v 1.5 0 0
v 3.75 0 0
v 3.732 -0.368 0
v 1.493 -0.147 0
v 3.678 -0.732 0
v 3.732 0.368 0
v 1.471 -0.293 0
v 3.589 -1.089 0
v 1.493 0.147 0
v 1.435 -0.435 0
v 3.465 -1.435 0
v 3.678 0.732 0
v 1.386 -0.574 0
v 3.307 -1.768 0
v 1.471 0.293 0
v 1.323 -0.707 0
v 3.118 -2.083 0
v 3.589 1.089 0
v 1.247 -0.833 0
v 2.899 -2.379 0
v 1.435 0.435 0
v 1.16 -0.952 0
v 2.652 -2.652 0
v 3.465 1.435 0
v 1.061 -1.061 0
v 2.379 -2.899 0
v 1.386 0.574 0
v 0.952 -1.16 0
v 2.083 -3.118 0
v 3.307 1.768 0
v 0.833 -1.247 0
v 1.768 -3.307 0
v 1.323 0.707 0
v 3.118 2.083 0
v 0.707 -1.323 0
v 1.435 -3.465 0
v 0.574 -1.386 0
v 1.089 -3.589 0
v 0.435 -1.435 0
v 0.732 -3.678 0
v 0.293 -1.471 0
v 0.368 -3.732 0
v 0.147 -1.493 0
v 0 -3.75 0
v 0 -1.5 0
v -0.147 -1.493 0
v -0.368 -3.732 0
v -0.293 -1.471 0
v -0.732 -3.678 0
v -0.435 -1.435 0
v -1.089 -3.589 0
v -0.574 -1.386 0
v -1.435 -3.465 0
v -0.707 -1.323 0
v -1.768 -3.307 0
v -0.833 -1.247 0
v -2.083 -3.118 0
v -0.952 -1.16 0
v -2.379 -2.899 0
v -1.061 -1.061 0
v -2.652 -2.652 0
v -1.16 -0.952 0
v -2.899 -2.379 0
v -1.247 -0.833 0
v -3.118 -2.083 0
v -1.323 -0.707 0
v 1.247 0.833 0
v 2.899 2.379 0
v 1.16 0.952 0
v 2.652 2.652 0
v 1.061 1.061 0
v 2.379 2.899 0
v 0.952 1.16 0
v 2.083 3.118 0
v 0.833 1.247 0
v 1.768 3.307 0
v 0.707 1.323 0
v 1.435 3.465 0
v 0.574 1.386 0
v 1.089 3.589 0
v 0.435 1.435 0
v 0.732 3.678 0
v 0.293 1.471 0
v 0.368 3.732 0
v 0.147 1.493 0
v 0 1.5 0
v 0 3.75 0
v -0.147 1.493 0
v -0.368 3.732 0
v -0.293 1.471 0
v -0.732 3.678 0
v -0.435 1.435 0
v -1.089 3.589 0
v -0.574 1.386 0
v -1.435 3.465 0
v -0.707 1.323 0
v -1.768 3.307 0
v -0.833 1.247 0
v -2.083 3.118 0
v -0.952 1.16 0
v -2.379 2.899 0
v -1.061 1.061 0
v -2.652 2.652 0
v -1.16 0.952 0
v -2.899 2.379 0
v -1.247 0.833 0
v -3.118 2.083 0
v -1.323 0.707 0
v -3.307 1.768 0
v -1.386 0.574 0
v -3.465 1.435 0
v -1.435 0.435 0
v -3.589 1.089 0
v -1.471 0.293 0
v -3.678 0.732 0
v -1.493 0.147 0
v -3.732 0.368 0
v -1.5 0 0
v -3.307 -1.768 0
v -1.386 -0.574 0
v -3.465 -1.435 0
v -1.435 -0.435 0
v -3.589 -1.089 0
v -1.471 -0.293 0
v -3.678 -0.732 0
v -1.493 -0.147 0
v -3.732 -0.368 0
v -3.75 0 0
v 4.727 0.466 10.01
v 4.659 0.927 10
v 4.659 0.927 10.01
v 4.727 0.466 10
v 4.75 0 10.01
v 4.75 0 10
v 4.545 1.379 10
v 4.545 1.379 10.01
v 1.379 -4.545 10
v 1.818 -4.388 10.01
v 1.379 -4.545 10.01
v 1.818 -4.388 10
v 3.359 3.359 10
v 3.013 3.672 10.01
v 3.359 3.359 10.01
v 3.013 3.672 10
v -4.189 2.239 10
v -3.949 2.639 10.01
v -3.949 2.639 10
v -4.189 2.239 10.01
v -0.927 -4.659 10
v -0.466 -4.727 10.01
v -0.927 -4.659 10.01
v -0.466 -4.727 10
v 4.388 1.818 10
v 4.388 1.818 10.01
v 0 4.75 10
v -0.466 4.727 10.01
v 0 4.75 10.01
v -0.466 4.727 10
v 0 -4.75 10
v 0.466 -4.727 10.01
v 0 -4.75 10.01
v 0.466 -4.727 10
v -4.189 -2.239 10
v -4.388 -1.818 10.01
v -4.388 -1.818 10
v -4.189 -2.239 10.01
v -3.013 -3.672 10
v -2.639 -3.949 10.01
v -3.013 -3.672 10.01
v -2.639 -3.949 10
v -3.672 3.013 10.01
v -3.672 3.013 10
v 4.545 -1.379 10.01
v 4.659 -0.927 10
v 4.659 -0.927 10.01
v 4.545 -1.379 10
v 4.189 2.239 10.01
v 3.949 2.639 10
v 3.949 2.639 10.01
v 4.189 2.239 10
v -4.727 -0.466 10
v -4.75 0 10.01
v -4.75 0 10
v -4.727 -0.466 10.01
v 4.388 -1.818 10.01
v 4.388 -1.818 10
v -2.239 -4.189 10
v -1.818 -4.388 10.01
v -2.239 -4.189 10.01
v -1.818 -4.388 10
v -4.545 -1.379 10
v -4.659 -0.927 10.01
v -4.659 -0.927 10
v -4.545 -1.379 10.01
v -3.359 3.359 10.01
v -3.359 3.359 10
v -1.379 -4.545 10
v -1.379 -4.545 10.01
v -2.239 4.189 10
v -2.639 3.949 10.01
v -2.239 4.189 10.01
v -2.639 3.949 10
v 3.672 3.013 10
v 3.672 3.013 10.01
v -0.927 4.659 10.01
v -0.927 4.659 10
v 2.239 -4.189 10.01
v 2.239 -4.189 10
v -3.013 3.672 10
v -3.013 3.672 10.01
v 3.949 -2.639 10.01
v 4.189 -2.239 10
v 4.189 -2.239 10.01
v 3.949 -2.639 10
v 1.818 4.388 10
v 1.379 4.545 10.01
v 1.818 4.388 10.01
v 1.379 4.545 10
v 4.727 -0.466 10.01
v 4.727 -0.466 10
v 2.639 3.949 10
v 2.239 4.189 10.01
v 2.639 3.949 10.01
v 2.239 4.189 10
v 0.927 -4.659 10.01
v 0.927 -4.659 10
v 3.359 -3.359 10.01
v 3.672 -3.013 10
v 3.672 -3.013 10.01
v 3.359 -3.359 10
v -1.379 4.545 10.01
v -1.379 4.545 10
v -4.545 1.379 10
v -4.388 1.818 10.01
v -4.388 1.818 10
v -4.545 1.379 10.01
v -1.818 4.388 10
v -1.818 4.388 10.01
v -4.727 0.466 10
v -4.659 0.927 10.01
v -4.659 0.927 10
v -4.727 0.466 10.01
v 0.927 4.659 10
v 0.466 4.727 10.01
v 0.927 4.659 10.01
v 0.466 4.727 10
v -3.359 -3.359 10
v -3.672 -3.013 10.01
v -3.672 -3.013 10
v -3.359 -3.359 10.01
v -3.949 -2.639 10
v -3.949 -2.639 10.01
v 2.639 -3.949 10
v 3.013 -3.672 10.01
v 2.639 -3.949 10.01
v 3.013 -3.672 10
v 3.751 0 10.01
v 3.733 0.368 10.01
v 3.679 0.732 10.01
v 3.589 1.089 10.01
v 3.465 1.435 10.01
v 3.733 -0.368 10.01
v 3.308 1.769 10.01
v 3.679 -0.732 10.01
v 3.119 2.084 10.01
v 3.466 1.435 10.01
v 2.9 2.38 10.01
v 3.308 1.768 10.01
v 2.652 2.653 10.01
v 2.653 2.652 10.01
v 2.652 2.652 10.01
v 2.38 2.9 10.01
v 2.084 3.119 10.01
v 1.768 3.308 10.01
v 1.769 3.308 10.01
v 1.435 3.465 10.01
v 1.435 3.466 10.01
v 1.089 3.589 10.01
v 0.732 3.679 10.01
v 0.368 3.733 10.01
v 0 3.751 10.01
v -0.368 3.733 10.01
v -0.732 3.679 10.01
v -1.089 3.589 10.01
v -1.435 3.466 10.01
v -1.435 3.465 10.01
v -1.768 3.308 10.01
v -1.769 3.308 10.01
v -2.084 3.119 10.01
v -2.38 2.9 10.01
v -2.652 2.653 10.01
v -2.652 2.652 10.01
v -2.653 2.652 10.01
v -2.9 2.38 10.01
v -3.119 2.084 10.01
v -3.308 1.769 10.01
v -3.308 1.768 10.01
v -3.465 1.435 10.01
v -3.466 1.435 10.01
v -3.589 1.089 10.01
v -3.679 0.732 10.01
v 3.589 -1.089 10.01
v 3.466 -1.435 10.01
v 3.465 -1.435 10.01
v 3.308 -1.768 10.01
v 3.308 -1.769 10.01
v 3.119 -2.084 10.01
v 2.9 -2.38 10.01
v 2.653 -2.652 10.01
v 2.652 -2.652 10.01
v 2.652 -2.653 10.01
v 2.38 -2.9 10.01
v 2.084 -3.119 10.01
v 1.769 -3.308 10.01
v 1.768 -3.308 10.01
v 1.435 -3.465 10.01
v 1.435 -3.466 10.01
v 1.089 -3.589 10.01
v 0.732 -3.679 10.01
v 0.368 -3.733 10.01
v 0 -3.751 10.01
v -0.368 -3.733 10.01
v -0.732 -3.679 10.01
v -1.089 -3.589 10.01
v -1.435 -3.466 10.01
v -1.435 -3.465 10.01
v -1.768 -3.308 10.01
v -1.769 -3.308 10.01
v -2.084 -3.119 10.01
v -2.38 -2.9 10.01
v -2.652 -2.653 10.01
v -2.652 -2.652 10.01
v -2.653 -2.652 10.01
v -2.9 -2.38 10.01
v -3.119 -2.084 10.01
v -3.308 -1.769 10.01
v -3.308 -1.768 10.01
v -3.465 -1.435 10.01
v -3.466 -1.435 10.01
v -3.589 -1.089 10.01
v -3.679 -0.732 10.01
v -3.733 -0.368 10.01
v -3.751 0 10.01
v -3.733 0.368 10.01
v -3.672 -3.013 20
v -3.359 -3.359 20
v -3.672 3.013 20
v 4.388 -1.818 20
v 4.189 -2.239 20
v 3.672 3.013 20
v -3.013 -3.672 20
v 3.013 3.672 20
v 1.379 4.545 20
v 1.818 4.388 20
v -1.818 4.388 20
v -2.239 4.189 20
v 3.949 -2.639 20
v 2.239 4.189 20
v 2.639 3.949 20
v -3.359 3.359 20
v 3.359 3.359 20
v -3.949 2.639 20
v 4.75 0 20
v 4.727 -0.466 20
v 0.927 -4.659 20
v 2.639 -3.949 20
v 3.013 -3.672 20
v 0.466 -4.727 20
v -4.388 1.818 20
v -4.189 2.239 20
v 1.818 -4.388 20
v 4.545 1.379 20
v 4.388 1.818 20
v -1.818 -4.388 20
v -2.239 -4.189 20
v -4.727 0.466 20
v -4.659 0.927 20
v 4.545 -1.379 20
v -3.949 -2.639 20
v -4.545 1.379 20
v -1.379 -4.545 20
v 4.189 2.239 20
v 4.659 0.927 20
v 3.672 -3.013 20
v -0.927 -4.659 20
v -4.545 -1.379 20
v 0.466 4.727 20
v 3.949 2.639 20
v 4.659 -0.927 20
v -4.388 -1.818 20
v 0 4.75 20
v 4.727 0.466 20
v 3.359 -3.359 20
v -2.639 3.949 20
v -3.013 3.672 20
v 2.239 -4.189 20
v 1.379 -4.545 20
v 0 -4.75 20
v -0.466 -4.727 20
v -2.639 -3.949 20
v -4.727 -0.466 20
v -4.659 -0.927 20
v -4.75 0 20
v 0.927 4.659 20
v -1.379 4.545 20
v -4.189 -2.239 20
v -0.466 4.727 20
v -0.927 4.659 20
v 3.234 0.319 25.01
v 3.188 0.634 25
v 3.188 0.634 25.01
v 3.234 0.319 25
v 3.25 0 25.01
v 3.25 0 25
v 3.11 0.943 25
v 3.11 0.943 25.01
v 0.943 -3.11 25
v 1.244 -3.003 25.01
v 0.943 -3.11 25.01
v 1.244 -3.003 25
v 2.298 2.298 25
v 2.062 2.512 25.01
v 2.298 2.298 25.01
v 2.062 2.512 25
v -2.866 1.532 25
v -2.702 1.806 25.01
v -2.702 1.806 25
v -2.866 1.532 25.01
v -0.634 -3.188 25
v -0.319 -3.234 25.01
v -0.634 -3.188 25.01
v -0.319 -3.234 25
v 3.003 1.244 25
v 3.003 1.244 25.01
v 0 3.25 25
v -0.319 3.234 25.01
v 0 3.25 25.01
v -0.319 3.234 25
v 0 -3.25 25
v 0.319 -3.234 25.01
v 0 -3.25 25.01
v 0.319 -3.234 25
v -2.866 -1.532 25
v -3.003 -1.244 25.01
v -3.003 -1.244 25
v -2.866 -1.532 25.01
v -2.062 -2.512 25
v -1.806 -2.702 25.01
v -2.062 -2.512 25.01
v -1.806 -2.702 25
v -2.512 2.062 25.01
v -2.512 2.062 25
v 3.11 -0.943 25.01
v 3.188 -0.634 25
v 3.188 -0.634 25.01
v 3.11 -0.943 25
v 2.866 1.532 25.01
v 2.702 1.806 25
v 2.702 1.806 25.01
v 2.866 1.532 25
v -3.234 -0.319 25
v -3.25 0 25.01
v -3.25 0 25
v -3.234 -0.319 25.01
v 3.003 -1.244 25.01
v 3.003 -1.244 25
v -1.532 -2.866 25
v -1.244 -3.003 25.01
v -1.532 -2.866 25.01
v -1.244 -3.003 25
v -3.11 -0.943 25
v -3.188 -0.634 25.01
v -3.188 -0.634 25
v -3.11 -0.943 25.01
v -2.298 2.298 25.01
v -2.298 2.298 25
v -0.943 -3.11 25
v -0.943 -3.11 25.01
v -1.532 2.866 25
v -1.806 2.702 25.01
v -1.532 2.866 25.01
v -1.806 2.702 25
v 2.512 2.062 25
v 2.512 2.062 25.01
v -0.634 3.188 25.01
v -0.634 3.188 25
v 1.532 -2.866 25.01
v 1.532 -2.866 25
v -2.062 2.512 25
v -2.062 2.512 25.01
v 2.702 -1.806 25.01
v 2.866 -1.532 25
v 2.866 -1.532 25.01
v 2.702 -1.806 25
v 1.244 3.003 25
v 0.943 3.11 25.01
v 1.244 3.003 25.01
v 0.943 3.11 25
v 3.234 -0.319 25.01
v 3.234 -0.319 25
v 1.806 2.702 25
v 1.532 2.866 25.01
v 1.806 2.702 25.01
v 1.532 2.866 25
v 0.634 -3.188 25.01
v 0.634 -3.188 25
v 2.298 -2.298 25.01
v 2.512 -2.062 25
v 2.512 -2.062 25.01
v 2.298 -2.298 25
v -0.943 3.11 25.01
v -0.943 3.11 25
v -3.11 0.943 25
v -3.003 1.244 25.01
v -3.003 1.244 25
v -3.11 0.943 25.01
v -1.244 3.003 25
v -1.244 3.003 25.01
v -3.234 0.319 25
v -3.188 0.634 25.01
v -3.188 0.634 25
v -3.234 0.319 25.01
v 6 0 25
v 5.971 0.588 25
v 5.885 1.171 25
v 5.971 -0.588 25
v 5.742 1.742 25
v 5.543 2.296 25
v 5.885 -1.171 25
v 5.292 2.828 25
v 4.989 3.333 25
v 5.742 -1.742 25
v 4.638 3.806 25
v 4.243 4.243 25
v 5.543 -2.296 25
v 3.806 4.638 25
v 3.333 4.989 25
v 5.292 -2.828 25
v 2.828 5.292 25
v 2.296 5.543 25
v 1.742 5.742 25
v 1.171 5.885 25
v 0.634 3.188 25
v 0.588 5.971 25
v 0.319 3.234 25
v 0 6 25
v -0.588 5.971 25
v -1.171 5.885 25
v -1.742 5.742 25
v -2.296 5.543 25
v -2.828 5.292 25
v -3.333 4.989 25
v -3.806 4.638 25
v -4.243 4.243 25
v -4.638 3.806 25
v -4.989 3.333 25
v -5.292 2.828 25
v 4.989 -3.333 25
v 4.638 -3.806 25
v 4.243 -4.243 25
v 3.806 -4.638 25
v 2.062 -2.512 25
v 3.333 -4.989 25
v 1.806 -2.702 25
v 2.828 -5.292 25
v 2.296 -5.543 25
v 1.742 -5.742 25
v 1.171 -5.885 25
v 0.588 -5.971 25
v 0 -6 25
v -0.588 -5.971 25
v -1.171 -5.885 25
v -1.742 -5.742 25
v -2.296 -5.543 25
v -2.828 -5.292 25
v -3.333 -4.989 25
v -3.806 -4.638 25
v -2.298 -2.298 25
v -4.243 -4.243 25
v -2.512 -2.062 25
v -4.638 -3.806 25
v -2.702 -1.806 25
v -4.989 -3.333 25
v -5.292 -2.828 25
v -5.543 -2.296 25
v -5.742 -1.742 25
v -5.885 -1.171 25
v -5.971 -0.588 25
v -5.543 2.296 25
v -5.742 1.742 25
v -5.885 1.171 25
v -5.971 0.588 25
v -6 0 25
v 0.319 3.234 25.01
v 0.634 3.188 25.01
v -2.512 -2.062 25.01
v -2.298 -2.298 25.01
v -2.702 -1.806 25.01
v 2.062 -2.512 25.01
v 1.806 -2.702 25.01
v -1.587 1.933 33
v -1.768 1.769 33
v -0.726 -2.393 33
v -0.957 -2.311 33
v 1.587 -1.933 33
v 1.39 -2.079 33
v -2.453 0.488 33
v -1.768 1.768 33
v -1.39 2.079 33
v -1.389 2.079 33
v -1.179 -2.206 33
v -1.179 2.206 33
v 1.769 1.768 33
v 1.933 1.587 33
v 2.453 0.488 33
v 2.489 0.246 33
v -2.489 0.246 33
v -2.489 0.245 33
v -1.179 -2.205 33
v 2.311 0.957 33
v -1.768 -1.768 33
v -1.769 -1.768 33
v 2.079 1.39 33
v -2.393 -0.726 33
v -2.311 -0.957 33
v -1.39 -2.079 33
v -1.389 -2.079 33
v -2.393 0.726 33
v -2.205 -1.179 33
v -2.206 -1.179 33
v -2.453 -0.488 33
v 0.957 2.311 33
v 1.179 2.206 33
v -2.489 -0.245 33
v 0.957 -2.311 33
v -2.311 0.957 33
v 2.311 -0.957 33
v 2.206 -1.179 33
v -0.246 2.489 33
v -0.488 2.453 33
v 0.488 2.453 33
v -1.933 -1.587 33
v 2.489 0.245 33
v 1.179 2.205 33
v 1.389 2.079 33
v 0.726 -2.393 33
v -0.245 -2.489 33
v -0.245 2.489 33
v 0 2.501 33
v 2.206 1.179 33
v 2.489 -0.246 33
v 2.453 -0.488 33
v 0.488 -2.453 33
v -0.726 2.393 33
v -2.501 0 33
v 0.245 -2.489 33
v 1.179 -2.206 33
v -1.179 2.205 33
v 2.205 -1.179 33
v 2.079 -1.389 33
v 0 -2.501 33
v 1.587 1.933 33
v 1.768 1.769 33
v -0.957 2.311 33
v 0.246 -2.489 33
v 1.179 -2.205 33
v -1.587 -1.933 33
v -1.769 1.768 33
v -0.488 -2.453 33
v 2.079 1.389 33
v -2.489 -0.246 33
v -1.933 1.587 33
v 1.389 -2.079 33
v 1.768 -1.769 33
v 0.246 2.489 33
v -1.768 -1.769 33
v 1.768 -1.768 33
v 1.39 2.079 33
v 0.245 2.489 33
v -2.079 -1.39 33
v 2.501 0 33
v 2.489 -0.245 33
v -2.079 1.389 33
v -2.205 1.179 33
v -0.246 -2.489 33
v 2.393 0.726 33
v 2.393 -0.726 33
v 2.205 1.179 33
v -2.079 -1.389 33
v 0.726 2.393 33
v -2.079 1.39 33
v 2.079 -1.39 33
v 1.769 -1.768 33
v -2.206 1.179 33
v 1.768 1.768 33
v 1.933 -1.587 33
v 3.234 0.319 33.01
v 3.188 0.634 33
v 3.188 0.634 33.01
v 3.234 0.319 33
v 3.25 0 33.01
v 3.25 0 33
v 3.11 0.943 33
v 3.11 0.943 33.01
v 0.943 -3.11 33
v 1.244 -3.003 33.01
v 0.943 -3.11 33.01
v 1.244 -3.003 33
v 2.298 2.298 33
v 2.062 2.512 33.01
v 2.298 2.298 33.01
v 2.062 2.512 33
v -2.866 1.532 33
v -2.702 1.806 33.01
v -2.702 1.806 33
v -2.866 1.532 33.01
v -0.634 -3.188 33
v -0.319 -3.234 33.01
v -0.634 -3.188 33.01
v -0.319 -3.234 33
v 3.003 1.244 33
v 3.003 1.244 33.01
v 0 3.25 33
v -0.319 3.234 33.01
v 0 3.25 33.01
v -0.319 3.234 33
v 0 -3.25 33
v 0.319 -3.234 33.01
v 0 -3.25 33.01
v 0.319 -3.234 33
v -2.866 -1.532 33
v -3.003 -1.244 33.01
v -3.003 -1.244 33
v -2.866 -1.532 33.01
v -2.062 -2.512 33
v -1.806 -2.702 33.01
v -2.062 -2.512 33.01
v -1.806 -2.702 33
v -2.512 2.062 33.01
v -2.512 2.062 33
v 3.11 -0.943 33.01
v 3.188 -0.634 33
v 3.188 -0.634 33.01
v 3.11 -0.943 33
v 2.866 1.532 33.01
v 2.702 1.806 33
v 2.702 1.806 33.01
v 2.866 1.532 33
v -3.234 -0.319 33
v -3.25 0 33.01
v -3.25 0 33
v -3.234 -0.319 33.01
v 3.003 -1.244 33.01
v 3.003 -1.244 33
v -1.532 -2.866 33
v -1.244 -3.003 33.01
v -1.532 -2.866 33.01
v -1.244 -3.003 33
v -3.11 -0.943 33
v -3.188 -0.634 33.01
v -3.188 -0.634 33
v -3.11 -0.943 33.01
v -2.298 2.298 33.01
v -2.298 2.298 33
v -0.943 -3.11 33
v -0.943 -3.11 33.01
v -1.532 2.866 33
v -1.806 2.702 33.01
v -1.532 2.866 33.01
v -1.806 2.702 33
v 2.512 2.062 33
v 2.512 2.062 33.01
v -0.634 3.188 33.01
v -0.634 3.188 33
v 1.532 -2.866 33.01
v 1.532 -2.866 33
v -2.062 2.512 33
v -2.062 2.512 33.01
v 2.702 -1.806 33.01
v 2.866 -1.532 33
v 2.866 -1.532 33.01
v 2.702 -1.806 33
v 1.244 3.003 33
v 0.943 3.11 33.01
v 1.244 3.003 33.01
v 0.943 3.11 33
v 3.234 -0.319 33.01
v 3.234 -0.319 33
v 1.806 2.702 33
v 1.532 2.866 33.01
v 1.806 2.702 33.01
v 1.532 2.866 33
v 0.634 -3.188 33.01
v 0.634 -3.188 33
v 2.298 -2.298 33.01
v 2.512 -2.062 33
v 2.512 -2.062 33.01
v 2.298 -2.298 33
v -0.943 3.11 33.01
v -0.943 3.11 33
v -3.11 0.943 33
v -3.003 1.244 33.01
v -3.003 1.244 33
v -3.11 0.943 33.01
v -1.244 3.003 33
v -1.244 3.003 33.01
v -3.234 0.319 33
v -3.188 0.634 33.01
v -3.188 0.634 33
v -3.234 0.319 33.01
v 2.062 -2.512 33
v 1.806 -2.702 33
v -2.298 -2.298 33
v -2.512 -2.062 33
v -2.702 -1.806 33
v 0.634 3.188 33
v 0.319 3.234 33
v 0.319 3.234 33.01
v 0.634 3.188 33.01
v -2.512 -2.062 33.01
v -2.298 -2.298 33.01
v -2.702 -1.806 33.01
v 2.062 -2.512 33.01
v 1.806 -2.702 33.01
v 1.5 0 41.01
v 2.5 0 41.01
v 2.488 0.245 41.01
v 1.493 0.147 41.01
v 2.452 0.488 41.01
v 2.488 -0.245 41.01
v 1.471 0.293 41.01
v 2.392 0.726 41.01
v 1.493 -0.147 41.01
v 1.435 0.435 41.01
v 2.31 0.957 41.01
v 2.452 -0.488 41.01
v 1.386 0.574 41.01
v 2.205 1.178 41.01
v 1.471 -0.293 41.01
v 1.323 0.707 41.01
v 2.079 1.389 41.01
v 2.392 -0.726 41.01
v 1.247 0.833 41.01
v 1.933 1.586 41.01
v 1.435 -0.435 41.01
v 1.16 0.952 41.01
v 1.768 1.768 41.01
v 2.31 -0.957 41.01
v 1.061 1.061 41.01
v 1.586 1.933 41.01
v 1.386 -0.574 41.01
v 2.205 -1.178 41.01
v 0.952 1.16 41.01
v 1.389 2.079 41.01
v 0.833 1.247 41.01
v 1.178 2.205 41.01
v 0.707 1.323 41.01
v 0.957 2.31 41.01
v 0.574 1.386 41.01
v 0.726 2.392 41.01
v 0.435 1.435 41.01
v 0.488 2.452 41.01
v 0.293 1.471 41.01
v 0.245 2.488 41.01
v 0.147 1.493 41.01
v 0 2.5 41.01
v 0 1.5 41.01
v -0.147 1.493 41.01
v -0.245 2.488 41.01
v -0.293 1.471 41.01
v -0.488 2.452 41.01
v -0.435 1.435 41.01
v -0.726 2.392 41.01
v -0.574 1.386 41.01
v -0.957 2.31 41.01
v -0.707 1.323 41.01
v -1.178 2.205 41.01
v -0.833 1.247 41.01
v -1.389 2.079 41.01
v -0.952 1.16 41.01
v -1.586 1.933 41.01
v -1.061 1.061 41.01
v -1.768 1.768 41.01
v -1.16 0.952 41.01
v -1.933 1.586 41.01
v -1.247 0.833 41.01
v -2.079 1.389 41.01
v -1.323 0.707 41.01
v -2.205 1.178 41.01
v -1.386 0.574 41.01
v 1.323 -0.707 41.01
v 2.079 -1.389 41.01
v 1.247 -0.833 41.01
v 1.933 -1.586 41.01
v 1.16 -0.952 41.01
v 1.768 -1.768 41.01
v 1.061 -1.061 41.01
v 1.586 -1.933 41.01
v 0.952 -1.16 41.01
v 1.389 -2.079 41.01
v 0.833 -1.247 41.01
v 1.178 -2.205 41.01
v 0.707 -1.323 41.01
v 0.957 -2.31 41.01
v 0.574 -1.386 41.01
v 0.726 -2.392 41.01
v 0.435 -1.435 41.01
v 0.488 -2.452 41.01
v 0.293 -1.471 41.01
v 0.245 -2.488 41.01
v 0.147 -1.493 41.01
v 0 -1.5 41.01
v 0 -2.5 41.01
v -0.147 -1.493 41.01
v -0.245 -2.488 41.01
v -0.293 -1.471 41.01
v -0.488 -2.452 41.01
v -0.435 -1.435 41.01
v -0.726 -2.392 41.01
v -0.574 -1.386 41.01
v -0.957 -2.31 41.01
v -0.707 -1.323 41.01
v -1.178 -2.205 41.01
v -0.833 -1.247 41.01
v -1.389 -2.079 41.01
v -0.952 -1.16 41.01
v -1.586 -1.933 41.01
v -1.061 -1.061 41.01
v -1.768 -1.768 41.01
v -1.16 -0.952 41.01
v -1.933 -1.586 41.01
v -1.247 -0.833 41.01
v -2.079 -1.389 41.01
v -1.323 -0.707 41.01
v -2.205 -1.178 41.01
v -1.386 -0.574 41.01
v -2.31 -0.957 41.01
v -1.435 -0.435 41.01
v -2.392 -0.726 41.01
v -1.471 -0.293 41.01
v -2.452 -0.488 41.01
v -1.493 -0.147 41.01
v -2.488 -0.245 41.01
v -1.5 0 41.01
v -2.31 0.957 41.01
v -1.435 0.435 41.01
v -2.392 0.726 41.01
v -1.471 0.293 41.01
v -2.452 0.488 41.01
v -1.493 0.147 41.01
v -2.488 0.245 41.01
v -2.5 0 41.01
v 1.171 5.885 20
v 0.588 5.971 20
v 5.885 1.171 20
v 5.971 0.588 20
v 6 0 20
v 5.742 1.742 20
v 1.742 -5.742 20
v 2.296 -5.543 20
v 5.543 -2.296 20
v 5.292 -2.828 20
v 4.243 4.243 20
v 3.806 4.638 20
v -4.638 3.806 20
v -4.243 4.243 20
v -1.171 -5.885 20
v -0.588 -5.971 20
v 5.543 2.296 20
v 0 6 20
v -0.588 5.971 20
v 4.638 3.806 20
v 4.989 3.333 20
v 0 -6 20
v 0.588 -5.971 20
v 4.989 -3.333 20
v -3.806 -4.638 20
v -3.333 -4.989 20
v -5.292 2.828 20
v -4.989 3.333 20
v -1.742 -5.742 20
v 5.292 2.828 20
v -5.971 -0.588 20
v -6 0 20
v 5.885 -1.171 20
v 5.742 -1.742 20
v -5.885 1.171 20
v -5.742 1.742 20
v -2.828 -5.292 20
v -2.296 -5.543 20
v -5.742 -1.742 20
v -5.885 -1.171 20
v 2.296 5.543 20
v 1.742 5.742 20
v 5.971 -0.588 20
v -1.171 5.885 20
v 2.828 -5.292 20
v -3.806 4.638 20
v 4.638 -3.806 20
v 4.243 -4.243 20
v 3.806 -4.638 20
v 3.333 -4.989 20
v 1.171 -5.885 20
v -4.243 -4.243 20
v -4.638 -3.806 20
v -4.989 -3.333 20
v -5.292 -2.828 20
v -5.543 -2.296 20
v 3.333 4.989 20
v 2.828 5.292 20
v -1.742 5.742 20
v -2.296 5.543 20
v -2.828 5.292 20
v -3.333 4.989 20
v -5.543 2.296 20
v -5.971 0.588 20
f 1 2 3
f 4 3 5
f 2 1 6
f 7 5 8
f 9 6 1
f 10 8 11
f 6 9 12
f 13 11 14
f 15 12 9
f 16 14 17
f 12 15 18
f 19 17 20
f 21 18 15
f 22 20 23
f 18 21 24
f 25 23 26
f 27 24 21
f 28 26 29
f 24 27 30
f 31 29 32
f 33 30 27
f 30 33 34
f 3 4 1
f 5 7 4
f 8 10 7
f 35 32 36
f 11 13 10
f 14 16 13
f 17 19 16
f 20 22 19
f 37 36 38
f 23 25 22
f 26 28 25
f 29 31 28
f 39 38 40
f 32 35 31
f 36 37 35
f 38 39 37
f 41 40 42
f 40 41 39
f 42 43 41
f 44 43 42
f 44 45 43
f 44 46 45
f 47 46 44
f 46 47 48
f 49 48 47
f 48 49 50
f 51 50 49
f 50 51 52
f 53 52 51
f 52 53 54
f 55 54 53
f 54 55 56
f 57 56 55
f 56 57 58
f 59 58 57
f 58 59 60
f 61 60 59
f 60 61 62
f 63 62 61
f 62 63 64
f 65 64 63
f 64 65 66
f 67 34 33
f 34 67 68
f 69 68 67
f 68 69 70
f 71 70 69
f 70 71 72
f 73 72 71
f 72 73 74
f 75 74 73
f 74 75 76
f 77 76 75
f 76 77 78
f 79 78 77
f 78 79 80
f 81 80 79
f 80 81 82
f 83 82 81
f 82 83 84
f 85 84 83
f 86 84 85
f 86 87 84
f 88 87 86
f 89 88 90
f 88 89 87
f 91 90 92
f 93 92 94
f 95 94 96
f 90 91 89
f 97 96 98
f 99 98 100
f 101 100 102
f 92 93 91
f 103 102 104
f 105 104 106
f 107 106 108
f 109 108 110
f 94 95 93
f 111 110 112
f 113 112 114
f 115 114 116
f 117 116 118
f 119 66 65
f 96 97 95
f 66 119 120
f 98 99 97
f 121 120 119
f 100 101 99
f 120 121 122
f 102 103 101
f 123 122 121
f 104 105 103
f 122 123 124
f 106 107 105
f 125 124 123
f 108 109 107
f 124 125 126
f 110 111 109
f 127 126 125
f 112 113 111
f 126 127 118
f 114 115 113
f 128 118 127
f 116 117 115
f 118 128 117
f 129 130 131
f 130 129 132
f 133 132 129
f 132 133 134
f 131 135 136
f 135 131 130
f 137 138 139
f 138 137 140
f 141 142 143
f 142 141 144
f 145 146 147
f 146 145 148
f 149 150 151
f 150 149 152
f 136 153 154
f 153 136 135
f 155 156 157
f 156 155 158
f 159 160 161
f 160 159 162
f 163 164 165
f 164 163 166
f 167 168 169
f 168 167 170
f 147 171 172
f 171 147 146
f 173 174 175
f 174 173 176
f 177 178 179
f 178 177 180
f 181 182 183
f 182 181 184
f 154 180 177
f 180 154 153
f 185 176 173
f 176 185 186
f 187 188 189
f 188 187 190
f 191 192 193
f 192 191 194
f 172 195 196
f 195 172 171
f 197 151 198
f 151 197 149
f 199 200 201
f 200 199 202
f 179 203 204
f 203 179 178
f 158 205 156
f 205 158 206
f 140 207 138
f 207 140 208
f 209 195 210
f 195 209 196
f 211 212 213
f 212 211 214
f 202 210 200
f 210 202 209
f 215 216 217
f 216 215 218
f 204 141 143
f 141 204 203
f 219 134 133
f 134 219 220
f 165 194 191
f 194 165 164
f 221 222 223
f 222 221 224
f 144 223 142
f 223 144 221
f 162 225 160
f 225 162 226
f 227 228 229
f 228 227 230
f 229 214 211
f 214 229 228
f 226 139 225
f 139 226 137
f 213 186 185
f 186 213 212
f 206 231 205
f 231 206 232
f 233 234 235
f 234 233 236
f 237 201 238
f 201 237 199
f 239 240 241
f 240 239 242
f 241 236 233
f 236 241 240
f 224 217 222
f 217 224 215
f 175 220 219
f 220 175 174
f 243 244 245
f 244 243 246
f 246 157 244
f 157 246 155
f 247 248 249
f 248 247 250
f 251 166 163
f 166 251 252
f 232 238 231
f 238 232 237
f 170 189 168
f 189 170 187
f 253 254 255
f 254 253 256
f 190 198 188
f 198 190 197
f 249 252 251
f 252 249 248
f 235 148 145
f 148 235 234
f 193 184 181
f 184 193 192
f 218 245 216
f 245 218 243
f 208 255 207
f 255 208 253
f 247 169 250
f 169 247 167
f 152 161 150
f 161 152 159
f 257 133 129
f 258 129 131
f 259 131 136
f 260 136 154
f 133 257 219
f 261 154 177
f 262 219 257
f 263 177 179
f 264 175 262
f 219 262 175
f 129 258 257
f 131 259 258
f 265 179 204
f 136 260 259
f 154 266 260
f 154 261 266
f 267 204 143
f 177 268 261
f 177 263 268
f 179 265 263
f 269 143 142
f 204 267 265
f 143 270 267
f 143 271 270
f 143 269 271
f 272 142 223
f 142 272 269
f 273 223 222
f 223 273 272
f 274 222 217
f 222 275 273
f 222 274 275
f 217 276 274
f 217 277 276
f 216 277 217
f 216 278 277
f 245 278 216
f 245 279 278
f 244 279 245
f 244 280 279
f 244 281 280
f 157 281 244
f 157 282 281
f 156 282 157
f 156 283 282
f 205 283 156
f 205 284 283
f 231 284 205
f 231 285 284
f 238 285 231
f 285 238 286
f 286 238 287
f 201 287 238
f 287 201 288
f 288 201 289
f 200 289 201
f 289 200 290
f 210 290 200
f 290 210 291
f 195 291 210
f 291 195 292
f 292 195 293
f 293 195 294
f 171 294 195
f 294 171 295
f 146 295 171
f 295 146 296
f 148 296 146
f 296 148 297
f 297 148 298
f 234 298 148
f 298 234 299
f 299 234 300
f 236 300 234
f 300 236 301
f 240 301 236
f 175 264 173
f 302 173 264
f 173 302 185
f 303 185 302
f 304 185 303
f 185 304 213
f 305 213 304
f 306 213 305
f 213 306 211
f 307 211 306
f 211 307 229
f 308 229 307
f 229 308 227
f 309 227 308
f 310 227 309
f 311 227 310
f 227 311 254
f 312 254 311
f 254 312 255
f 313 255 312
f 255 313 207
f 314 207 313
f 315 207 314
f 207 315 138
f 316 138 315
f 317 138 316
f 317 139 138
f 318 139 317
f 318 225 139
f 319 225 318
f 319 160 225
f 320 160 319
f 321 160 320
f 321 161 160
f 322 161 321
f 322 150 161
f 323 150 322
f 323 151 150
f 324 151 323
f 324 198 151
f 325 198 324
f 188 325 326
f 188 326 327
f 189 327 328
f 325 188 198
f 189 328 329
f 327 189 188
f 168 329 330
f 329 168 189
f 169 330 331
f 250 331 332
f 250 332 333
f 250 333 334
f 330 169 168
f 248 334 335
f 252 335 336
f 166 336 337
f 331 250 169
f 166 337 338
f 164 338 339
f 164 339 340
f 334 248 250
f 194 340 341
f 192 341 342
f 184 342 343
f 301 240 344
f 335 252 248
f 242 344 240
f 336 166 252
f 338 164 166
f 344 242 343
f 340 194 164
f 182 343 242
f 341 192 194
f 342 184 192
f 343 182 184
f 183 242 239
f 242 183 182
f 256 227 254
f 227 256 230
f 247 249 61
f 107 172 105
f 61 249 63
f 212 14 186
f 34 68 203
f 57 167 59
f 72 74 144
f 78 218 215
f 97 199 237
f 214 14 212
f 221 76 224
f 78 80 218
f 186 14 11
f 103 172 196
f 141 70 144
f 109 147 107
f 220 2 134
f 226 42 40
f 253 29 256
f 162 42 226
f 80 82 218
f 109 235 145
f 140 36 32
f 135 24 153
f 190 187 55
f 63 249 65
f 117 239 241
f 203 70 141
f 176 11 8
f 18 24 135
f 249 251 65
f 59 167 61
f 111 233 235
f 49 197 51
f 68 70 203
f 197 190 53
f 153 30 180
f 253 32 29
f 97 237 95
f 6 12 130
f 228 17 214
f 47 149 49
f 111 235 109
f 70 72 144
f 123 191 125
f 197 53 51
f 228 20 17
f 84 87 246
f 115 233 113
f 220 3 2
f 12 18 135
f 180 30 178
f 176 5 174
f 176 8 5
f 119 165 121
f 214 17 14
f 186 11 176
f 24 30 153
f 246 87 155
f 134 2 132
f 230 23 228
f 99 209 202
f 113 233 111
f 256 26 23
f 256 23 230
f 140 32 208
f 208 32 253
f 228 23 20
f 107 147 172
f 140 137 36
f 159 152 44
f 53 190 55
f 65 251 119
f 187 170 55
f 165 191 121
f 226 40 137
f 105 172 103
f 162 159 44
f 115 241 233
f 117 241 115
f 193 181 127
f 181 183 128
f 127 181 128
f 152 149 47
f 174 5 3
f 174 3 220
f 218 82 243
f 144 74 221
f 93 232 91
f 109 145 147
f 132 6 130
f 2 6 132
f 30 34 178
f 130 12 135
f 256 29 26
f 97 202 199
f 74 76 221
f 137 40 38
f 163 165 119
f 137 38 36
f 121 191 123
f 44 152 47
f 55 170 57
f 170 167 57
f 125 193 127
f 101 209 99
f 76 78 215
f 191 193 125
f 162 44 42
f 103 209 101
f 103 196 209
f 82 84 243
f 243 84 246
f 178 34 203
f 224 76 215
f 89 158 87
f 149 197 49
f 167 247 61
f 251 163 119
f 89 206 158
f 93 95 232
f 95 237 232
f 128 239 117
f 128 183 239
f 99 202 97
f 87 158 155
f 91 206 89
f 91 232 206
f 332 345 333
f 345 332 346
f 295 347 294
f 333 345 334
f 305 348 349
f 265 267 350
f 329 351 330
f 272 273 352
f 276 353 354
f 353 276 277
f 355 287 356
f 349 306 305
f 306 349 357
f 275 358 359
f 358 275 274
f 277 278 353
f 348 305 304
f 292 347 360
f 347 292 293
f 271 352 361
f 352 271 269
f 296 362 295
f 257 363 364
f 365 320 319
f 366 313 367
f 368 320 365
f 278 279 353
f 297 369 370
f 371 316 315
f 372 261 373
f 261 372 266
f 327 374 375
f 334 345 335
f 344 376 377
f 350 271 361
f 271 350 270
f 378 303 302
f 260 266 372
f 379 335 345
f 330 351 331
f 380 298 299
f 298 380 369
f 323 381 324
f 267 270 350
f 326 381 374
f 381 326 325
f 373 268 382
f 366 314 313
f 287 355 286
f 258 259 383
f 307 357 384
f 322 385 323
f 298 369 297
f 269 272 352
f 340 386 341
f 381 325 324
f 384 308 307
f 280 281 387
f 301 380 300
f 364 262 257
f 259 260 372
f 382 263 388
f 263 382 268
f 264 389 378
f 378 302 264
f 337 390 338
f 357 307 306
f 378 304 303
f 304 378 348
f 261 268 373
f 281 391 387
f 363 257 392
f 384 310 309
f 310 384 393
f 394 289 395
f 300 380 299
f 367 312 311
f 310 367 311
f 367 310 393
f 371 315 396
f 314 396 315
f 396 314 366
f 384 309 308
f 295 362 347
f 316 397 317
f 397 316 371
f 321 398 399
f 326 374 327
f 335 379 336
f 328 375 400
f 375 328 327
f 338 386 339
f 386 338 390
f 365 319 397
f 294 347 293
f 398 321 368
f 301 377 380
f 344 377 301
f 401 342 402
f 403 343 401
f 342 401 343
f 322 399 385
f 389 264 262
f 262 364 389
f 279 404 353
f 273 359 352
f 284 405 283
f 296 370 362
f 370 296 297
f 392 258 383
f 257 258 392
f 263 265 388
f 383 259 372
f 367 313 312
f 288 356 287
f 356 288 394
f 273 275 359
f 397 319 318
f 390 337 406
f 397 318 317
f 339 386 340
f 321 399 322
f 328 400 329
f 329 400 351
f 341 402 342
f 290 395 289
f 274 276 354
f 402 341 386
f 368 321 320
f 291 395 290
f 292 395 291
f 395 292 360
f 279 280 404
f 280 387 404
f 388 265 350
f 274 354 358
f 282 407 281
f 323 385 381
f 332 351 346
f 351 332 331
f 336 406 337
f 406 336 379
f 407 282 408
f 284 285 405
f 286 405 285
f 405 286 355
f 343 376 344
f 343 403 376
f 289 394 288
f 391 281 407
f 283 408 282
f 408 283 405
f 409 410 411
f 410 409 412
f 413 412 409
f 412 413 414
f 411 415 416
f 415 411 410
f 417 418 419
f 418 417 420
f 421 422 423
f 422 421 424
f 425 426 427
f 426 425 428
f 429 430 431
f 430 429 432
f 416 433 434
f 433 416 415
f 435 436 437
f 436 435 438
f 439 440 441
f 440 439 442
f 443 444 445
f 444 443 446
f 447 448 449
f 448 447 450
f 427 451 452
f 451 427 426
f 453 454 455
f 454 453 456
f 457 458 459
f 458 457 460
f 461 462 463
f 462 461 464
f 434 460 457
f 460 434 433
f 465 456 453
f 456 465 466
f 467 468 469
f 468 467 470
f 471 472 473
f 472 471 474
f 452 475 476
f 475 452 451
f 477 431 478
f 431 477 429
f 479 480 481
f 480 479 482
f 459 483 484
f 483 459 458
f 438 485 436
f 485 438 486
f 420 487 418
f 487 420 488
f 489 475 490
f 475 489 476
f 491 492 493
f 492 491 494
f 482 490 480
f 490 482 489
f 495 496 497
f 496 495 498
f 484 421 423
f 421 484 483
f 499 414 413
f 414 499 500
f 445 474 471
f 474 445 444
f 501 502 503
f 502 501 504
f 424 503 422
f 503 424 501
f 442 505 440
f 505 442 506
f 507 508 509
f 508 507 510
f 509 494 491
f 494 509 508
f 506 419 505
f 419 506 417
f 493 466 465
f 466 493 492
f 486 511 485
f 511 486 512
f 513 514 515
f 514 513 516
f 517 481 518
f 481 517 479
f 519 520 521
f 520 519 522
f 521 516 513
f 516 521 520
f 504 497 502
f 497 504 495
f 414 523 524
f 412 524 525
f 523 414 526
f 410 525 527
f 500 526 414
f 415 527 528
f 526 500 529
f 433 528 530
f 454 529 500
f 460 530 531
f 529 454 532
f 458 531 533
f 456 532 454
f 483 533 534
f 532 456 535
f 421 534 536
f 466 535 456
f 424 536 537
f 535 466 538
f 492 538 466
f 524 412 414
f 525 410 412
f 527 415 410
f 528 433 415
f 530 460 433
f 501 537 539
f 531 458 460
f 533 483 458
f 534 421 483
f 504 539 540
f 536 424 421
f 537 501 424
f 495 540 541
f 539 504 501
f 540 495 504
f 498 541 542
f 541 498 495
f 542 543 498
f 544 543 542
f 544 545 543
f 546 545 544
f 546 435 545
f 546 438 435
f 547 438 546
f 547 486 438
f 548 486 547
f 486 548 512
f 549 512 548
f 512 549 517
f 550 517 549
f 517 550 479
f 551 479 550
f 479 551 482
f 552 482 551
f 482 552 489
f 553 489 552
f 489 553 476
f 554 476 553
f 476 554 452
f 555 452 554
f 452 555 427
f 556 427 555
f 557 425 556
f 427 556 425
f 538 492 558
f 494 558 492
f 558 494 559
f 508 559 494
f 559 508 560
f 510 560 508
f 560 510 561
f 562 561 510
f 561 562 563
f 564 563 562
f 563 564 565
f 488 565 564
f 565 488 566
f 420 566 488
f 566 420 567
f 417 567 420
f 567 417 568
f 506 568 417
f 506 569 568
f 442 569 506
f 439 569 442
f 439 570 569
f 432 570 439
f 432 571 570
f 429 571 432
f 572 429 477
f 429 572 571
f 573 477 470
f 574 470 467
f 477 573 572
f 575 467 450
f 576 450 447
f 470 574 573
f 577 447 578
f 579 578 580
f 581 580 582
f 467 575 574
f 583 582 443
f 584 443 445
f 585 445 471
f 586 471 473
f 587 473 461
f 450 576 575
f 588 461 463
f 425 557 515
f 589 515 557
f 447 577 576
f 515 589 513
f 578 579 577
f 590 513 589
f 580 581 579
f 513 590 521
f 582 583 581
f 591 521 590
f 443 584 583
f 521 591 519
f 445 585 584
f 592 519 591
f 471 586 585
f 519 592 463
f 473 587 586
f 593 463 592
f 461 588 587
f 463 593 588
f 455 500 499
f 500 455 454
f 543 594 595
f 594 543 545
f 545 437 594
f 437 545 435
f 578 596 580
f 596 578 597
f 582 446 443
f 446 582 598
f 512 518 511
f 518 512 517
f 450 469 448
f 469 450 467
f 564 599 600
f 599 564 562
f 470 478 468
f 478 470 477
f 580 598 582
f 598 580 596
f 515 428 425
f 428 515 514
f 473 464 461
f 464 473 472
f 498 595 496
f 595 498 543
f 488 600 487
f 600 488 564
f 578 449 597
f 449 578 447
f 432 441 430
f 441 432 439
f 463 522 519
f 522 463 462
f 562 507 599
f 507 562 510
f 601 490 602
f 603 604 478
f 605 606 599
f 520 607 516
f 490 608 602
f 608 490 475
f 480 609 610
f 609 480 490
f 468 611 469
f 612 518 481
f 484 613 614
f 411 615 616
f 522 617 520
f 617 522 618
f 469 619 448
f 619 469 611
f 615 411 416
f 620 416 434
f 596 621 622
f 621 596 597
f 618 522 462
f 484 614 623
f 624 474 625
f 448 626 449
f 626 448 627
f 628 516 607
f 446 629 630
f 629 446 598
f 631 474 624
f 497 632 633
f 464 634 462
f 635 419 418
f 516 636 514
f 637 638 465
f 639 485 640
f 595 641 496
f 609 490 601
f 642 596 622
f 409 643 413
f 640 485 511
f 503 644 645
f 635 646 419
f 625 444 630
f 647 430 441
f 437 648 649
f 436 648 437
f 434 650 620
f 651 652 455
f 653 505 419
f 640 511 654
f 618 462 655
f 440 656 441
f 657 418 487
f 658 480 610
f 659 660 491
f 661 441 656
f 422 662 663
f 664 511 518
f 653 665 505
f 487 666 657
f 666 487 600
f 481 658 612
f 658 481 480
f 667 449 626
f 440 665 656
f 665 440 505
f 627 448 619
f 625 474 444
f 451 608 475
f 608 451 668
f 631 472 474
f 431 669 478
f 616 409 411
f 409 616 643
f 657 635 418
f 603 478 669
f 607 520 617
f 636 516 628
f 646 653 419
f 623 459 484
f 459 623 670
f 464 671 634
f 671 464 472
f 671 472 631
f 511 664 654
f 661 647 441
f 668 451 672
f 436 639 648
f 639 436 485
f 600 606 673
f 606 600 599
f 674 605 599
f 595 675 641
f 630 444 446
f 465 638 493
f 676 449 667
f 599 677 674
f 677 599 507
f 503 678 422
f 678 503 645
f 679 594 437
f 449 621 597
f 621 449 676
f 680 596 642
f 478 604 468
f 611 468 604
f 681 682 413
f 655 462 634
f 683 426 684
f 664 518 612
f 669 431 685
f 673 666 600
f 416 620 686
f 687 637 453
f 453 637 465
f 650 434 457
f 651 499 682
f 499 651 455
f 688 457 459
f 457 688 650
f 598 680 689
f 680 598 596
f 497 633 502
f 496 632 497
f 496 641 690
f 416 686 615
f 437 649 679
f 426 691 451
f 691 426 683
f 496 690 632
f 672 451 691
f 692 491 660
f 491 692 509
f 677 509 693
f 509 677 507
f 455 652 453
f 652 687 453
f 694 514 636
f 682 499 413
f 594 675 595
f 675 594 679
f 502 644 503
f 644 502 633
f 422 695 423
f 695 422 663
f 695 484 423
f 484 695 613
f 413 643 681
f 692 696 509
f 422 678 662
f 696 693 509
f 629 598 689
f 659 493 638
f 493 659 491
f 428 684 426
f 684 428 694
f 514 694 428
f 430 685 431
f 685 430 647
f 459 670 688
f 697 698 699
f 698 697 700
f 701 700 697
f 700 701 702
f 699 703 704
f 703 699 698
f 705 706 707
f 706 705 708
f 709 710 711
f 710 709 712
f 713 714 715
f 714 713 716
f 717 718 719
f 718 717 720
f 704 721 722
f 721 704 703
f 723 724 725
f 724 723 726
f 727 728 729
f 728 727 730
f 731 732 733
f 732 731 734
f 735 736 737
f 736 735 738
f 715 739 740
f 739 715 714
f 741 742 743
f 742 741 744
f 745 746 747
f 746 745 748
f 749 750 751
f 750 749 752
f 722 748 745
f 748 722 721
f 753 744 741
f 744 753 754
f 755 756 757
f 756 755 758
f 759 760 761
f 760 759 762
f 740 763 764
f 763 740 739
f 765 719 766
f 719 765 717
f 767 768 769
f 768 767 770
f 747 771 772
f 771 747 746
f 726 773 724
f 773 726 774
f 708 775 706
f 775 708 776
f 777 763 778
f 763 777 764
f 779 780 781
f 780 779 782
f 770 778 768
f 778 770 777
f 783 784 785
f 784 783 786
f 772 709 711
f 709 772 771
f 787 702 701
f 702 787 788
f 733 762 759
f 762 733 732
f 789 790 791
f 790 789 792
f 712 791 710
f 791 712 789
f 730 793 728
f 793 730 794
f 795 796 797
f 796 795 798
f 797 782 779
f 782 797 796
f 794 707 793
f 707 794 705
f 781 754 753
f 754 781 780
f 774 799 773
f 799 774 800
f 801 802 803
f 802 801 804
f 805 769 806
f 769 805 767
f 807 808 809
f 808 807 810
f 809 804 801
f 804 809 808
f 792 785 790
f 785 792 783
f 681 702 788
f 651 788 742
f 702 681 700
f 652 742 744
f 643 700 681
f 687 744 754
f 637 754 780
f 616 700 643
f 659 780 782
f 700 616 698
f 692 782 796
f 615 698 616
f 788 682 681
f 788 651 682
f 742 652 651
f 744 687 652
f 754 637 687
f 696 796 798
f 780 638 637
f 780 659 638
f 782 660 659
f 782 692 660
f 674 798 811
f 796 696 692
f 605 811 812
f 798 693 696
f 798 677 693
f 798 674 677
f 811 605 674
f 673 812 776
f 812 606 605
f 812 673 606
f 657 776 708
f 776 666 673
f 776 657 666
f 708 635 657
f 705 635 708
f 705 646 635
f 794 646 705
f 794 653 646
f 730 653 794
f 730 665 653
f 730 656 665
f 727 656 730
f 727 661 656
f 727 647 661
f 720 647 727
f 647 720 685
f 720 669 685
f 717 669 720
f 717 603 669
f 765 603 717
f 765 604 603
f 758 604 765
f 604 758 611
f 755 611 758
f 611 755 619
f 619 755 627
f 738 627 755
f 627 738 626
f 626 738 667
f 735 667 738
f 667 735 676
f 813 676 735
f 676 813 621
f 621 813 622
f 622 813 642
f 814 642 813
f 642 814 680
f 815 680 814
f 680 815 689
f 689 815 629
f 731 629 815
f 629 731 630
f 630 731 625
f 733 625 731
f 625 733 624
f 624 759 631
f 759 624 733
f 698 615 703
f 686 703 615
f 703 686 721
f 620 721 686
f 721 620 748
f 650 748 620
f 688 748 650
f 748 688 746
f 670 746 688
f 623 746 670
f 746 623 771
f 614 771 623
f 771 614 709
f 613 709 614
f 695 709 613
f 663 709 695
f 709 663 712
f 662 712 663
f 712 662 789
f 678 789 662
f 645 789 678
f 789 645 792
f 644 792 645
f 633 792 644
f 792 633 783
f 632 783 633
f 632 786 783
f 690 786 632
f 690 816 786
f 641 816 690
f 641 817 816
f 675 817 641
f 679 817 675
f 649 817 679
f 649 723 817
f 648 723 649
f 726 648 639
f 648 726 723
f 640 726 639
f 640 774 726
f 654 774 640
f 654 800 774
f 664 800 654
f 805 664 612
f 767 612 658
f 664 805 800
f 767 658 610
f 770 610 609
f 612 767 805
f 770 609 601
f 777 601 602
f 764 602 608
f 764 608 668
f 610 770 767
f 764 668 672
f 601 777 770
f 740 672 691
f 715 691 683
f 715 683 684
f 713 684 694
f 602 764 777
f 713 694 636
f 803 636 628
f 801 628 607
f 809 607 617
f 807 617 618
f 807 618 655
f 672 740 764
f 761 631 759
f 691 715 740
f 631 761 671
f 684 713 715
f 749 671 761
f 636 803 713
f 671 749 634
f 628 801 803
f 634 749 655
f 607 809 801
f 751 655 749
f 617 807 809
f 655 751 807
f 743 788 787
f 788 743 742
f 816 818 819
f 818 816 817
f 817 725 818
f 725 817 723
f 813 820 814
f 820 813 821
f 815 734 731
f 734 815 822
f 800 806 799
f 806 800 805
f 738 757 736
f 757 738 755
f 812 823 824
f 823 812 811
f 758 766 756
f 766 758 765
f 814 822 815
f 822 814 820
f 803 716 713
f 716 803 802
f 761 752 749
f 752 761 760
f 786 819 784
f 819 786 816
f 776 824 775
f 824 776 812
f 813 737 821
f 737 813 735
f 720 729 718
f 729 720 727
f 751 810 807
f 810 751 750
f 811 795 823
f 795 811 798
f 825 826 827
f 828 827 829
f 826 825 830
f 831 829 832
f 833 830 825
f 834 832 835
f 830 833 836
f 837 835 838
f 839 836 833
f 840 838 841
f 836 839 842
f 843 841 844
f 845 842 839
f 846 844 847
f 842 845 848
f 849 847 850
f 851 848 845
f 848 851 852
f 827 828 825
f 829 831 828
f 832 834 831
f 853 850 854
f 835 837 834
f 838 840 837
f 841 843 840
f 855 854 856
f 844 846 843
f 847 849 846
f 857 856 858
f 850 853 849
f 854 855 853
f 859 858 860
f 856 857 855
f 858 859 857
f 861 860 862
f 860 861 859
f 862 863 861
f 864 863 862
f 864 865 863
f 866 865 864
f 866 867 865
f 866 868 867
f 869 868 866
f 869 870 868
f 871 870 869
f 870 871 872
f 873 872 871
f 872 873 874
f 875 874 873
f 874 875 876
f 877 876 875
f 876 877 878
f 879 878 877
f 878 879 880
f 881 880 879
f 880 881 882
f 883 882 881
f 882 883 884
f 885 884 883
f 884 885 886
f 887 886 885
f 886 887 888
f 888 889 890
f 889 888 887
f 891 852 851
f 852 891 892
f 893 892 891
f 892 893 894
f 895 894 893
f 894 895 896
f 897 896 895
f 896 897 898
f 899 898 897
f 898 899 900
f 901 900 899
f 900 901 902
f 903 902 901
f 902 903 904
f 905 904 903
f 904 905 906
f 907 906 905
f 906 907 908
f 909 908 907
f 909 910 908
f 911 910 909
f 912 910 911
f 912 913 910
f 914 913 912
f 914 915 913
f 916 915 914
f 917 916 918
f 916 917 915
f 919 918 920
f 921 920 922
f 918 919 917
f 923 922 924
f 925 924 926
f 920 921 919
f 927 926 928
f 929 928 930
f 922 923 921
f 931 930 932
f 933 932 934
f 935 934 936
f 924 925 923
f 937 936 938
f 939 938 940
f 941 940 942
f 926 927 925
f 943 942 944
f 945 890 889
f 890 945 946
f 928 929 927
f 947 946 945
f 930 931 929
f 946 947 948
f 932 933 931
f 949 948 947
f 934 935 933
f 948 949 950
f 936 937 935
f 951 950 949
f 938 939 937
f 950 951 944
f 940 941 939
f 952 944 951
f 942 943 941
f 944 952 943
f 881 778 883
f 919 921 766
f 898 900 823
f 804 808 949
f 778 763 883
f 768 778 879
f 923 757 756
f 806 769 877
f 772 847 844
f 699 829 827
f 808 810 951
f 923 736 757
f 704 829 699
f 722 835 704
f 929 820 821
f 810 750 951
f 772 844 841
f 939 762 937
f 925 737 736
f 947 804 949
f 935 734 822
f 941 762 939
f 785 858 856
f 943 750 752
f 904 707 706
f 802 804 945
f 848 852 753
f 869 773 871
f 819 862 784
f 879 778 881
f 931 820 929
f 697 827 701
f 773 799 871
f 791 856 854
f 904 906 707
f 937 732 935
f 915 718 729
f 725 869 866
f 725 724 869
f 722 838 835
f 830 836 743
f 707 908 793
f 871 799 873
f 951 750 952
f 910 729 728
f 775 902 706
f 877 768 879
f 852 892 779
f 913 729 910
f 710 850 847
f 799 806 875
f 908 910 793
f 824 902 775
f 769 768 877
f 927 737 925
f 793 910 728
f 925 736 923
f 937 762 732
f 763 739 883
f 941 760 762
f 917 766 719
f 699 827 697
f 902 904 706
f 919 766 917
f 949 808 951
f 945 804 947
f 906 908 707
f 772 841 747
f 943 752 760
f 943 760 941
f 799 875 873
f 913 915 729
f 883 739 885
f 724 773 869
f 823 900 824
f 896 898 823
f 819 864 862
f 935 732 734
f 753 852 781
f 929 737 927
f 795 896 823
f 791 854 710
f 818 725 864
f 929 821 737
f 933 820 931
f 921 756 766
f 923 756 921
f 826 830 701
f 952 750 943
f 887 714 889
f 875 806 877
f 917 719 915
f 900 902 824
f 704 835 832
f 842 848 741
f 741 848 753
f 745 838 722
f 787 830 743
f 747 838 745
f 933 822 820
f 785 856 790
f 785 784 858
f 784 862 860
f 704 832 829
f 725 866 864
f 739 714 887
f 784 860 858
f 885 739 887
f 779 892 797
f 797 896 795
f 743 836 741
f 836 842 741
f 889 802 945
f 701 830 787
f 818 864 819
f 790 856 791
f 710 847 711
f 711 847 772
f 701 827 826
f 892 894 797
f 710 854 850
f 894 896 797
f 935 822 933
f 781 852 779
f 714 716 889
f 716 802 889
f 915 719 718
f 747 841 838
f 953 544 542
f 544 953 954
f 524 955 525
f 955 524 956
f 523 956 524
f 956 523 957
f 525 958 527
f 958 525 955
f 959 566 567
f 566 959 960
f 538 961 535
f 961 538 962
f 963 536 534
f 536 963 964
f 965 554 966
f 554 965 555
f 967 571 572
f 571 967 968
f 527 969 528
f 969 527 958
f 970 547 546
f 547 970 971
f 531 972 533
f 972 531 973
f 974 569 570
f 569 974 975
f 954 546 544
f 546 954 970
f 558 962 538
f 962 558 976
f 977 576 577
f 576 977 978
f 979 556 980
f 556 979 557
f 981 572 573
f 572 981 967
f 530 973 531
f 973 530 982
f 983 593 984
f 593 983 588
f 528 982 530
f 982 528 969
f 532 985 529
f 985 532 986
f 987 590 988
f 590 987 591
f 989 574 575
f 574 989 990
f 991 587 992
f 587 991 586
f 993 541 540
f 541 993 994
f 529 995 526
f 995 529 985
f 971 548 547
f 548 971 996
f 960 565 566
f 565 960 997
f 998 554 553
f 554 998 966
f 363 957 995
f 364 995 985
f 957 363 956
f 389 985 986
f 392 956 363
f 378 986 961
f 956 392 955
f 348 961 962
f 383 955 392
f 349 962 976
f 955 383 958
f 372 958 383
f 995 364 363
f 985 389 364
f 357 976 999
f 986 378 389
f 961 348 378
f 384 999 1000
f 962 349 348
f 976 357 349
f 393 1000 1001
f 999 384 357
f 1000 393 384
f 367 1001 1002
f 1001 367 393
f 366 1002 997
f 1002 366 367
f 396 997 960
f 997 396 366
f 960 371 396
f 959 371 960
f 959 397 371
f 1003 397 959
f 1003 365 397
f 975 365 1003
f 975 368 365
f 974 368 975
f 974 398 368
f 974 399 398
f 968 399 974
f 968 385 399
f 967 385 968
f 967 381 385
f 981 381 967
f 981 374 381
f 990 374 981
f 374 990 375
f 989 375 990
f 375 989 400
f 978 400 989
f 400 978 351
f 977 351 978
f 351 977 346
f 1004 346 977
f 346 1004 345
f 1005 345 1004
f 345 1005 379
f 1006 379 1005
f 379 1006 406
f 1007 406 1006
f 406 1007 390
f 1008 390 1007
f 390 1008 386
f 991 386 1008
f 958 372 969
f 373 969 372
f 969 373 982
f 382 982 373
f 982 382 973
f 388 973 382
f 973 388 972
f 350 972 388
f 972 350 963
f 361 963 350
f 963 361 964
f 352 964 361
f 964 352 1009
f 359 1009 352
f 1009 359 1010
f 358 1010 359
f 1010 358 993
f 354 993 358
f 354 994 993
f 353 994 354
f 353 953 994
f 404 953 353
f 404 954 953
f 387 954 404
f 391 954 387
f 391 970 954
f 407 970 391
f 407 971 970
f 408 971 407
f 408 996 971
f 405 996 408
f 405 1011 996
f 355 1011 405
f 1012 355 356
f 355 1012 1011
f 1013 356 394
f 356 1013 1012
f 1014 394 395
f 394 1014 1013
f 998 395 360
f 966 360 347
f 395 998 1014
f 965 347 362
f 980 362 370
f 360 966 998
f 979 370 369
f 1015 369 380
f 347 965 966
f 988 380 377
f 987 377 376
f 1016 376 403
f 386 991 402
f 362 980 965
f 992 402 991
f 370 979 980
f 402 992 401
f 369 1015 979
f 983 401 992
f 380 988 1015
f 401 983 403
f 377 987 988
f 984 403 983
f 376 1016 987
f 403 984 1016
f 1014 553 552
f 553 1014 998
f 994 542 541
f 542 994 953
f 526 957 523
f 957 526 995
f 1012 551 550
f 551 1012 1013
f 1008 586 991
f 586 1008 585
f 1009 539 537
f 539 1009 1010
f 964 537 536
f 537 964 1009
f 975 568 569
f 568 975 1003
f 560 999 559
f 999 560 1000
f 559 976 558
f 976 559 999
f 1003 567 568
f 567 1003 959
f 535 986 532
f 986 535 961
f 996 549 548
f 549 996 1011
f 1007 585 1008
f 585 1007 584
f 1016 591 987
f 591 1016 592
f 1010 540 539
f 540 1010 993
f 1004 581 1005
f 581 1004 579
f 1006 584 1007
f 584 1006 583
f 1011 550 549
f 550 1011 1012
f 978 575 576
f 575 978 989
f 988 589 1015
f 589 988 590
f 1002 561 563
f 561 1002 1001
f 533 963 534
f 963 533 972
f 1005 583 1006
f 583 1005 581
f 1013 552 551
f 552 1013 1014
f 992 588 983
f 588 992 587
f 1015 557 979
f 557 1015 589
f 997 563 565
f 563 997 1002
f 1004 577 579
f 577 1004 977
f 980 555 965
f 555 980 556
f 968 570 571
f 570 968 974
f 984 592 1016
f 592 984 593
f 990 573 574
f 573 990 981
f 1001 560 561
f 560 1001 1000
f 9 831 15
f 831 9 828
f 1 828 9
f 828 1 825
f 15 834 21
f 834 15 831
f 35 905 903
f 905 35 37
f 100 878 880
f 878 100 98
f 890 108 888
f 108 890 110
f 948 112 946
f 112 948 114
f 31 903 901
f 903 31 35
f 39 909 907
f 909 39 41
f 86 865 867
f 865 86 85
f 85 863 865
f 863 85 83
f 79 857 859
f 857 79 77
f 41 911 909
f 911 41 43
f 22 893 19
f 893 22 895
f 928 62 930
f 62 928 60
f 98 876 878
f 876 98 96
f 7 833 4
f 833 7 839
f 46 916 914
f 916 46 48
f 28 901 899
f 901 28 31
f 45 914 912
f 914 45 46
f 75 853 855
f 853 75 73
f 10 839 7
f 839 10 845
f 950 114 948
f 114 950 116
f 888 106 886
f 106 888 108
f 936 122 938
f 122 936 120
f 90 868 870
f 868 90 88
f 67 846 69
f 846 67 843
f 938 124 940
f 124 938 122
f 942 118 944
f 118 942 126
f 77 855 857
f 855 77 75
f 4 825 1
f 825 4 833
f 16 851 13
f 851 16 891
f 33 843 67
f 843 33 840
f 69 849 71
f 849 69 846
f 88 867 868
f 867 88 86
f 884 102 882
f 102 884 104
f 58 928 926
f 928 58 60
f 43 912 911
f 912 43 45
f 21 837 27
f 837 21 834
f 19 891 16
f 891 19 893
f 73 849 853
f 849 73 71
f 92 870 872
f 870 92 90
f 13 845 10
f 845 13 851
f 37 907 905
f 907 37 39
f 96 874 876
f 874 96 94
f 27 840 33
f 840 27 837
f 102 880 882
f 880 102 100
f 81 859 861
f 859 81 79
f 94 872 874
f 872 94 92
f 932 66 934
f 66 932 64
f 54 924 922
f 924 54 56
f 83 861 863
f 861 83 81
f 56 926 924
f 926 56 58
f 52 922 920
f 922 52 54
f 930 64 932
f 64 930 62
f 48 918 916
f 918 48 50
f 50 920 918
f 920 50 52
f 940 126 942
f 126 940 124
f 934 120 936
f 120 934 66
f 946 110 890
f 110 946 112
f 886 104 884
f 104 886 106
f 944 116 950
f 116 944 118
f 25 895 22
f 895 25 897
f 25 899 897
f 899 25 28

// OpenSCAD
// Hose Barb Reducer: 8mm ID to 5mm ID
// Designed for FDM printing, standing upright along Z-axis.

// Global settings
$fn = 64; // High resolution for smooth curves

// --- Dimensions for 8mm Tubing Barbs (Bottom Section) ---
tubing_8mm_id = 8;
barb_8mm_height = 10; // Height of each individual barb
barb_8mm_bottom_od = 7.5; // OD at the base of the barb
barb_8mm_top_od = 9.5; // OD at the tip of the barb
num_barbs_8mm = 2; // Number of stacked barbs

// --- Dimensions for 5mm Tubing Barbs (Top Section) ---
tubing_5mm_id = 5;
barb_5mm_height = 8; // Height of each individual barb
barb_5mm_bottom_od = 6.5; // OD at the base of the barb
barb_5mm_top_od = 5.0; // OD at the tip of the barb
num_barbs_5mm = 2; // Number of stacked barbs

// --- Dimensions for Collar (Middle Section) ---
collar_z_start = 20;
collar_z_end = 25;
collar_diameter = 12;

// --- Bore Dimensions ---
bore_diameter = 3;
total_length = 41; // Total height of the part

// --- Helper Module: Create a single tapered barb segment ---
// This creates a frustum (tapered cylinder) representing one barb tooth.
// It is centered at the origin in X/Y, and extends from z=0 to z=height.
module barb_segment(height, bottom_od, top_od) {
    // We use a linear_extrude of a polygon to create the taper, 
    // or simply a cylinder with different radii if we were using a more complex approach.
    // However, OpenSCAD's cylinder only supports constant radius.
    // So we use a linear_extrude of a trapezoid, or better yet, a rotate_extrude of a polygon.
    // Actually, the simplest way to make a tapered cylinder in OpenSCAD is using a hull of two circles 
    // or a linear_extrude. Let's use linear_extrude of a polygon for precision.
    
    // Define the cross-section profile (half-profile for rotate_extrude is easier)
    // But since we are building the whole object, let's just use a cylinder approximation 
    // or a hull. A hull of two cylinders (one at bottom, one at top) works well.
    
    // Bottom circle
    translate([0, 0, 0])
        cylinder(h = 0.01, r = bottom_od / 2, center = false);
        
    // Top circle
    translate([0, 0, height])
        cylinder(h = 0.01, r = top_od / 2, center = false);
        
    // Hull them together to create the taper
    hull() {
        translate([0, 0, 0])
            cylinder(h = 0.01, r = bottom_od / 2, center = false);
        translate([0, 0, height])
            cylinder(h = 0.01, r = top_od / 2, center = false);
    }
}

// --- Main Body Construction ---
difference() {
    union() {
        // 1. Bottom Section: 8mm Tubing Barbs (z = 0 to z = 20)
        for (i = [0 : num_barbs_8mm - 1]) {
            z_offset = i * barb_8mm_height;
            translate([0, 0, z_offset])
                barb_segment(barb_8mm_height, barb_8mm_bottom_od, barb_8mm_top_od);
        }
        
        // 2. Middle Section: Collar (z = 20 to z = 25)
        translate([0, 0, collar_z_start])
            cylinder(h = collar_z_end - collar_z_start, d = collar_diameter, center = false);
            
        // 3. Top Section: 5mm Tubing Barbs (z = 25 to z = 41)
        for (i = [0 : num_barbs_5mm - 1]) {
            z_offset = collar_z_end + i * barb_5mm_height;
            translate([0, 0, z_offset])
                barb_segment(barb_5mm_height, barb_5mm_bottom_od, barb_5mm_top_od);
        }
    }
    
    // 4. Central Bore (z = 0 to z = 41)
    // Extend slightly past the top and bottom to ensure clean cuts
    translate([0, 0, -0.1])
        cylinder(h = total_length + 0.2, d = bore_diameter, center = false);
}
